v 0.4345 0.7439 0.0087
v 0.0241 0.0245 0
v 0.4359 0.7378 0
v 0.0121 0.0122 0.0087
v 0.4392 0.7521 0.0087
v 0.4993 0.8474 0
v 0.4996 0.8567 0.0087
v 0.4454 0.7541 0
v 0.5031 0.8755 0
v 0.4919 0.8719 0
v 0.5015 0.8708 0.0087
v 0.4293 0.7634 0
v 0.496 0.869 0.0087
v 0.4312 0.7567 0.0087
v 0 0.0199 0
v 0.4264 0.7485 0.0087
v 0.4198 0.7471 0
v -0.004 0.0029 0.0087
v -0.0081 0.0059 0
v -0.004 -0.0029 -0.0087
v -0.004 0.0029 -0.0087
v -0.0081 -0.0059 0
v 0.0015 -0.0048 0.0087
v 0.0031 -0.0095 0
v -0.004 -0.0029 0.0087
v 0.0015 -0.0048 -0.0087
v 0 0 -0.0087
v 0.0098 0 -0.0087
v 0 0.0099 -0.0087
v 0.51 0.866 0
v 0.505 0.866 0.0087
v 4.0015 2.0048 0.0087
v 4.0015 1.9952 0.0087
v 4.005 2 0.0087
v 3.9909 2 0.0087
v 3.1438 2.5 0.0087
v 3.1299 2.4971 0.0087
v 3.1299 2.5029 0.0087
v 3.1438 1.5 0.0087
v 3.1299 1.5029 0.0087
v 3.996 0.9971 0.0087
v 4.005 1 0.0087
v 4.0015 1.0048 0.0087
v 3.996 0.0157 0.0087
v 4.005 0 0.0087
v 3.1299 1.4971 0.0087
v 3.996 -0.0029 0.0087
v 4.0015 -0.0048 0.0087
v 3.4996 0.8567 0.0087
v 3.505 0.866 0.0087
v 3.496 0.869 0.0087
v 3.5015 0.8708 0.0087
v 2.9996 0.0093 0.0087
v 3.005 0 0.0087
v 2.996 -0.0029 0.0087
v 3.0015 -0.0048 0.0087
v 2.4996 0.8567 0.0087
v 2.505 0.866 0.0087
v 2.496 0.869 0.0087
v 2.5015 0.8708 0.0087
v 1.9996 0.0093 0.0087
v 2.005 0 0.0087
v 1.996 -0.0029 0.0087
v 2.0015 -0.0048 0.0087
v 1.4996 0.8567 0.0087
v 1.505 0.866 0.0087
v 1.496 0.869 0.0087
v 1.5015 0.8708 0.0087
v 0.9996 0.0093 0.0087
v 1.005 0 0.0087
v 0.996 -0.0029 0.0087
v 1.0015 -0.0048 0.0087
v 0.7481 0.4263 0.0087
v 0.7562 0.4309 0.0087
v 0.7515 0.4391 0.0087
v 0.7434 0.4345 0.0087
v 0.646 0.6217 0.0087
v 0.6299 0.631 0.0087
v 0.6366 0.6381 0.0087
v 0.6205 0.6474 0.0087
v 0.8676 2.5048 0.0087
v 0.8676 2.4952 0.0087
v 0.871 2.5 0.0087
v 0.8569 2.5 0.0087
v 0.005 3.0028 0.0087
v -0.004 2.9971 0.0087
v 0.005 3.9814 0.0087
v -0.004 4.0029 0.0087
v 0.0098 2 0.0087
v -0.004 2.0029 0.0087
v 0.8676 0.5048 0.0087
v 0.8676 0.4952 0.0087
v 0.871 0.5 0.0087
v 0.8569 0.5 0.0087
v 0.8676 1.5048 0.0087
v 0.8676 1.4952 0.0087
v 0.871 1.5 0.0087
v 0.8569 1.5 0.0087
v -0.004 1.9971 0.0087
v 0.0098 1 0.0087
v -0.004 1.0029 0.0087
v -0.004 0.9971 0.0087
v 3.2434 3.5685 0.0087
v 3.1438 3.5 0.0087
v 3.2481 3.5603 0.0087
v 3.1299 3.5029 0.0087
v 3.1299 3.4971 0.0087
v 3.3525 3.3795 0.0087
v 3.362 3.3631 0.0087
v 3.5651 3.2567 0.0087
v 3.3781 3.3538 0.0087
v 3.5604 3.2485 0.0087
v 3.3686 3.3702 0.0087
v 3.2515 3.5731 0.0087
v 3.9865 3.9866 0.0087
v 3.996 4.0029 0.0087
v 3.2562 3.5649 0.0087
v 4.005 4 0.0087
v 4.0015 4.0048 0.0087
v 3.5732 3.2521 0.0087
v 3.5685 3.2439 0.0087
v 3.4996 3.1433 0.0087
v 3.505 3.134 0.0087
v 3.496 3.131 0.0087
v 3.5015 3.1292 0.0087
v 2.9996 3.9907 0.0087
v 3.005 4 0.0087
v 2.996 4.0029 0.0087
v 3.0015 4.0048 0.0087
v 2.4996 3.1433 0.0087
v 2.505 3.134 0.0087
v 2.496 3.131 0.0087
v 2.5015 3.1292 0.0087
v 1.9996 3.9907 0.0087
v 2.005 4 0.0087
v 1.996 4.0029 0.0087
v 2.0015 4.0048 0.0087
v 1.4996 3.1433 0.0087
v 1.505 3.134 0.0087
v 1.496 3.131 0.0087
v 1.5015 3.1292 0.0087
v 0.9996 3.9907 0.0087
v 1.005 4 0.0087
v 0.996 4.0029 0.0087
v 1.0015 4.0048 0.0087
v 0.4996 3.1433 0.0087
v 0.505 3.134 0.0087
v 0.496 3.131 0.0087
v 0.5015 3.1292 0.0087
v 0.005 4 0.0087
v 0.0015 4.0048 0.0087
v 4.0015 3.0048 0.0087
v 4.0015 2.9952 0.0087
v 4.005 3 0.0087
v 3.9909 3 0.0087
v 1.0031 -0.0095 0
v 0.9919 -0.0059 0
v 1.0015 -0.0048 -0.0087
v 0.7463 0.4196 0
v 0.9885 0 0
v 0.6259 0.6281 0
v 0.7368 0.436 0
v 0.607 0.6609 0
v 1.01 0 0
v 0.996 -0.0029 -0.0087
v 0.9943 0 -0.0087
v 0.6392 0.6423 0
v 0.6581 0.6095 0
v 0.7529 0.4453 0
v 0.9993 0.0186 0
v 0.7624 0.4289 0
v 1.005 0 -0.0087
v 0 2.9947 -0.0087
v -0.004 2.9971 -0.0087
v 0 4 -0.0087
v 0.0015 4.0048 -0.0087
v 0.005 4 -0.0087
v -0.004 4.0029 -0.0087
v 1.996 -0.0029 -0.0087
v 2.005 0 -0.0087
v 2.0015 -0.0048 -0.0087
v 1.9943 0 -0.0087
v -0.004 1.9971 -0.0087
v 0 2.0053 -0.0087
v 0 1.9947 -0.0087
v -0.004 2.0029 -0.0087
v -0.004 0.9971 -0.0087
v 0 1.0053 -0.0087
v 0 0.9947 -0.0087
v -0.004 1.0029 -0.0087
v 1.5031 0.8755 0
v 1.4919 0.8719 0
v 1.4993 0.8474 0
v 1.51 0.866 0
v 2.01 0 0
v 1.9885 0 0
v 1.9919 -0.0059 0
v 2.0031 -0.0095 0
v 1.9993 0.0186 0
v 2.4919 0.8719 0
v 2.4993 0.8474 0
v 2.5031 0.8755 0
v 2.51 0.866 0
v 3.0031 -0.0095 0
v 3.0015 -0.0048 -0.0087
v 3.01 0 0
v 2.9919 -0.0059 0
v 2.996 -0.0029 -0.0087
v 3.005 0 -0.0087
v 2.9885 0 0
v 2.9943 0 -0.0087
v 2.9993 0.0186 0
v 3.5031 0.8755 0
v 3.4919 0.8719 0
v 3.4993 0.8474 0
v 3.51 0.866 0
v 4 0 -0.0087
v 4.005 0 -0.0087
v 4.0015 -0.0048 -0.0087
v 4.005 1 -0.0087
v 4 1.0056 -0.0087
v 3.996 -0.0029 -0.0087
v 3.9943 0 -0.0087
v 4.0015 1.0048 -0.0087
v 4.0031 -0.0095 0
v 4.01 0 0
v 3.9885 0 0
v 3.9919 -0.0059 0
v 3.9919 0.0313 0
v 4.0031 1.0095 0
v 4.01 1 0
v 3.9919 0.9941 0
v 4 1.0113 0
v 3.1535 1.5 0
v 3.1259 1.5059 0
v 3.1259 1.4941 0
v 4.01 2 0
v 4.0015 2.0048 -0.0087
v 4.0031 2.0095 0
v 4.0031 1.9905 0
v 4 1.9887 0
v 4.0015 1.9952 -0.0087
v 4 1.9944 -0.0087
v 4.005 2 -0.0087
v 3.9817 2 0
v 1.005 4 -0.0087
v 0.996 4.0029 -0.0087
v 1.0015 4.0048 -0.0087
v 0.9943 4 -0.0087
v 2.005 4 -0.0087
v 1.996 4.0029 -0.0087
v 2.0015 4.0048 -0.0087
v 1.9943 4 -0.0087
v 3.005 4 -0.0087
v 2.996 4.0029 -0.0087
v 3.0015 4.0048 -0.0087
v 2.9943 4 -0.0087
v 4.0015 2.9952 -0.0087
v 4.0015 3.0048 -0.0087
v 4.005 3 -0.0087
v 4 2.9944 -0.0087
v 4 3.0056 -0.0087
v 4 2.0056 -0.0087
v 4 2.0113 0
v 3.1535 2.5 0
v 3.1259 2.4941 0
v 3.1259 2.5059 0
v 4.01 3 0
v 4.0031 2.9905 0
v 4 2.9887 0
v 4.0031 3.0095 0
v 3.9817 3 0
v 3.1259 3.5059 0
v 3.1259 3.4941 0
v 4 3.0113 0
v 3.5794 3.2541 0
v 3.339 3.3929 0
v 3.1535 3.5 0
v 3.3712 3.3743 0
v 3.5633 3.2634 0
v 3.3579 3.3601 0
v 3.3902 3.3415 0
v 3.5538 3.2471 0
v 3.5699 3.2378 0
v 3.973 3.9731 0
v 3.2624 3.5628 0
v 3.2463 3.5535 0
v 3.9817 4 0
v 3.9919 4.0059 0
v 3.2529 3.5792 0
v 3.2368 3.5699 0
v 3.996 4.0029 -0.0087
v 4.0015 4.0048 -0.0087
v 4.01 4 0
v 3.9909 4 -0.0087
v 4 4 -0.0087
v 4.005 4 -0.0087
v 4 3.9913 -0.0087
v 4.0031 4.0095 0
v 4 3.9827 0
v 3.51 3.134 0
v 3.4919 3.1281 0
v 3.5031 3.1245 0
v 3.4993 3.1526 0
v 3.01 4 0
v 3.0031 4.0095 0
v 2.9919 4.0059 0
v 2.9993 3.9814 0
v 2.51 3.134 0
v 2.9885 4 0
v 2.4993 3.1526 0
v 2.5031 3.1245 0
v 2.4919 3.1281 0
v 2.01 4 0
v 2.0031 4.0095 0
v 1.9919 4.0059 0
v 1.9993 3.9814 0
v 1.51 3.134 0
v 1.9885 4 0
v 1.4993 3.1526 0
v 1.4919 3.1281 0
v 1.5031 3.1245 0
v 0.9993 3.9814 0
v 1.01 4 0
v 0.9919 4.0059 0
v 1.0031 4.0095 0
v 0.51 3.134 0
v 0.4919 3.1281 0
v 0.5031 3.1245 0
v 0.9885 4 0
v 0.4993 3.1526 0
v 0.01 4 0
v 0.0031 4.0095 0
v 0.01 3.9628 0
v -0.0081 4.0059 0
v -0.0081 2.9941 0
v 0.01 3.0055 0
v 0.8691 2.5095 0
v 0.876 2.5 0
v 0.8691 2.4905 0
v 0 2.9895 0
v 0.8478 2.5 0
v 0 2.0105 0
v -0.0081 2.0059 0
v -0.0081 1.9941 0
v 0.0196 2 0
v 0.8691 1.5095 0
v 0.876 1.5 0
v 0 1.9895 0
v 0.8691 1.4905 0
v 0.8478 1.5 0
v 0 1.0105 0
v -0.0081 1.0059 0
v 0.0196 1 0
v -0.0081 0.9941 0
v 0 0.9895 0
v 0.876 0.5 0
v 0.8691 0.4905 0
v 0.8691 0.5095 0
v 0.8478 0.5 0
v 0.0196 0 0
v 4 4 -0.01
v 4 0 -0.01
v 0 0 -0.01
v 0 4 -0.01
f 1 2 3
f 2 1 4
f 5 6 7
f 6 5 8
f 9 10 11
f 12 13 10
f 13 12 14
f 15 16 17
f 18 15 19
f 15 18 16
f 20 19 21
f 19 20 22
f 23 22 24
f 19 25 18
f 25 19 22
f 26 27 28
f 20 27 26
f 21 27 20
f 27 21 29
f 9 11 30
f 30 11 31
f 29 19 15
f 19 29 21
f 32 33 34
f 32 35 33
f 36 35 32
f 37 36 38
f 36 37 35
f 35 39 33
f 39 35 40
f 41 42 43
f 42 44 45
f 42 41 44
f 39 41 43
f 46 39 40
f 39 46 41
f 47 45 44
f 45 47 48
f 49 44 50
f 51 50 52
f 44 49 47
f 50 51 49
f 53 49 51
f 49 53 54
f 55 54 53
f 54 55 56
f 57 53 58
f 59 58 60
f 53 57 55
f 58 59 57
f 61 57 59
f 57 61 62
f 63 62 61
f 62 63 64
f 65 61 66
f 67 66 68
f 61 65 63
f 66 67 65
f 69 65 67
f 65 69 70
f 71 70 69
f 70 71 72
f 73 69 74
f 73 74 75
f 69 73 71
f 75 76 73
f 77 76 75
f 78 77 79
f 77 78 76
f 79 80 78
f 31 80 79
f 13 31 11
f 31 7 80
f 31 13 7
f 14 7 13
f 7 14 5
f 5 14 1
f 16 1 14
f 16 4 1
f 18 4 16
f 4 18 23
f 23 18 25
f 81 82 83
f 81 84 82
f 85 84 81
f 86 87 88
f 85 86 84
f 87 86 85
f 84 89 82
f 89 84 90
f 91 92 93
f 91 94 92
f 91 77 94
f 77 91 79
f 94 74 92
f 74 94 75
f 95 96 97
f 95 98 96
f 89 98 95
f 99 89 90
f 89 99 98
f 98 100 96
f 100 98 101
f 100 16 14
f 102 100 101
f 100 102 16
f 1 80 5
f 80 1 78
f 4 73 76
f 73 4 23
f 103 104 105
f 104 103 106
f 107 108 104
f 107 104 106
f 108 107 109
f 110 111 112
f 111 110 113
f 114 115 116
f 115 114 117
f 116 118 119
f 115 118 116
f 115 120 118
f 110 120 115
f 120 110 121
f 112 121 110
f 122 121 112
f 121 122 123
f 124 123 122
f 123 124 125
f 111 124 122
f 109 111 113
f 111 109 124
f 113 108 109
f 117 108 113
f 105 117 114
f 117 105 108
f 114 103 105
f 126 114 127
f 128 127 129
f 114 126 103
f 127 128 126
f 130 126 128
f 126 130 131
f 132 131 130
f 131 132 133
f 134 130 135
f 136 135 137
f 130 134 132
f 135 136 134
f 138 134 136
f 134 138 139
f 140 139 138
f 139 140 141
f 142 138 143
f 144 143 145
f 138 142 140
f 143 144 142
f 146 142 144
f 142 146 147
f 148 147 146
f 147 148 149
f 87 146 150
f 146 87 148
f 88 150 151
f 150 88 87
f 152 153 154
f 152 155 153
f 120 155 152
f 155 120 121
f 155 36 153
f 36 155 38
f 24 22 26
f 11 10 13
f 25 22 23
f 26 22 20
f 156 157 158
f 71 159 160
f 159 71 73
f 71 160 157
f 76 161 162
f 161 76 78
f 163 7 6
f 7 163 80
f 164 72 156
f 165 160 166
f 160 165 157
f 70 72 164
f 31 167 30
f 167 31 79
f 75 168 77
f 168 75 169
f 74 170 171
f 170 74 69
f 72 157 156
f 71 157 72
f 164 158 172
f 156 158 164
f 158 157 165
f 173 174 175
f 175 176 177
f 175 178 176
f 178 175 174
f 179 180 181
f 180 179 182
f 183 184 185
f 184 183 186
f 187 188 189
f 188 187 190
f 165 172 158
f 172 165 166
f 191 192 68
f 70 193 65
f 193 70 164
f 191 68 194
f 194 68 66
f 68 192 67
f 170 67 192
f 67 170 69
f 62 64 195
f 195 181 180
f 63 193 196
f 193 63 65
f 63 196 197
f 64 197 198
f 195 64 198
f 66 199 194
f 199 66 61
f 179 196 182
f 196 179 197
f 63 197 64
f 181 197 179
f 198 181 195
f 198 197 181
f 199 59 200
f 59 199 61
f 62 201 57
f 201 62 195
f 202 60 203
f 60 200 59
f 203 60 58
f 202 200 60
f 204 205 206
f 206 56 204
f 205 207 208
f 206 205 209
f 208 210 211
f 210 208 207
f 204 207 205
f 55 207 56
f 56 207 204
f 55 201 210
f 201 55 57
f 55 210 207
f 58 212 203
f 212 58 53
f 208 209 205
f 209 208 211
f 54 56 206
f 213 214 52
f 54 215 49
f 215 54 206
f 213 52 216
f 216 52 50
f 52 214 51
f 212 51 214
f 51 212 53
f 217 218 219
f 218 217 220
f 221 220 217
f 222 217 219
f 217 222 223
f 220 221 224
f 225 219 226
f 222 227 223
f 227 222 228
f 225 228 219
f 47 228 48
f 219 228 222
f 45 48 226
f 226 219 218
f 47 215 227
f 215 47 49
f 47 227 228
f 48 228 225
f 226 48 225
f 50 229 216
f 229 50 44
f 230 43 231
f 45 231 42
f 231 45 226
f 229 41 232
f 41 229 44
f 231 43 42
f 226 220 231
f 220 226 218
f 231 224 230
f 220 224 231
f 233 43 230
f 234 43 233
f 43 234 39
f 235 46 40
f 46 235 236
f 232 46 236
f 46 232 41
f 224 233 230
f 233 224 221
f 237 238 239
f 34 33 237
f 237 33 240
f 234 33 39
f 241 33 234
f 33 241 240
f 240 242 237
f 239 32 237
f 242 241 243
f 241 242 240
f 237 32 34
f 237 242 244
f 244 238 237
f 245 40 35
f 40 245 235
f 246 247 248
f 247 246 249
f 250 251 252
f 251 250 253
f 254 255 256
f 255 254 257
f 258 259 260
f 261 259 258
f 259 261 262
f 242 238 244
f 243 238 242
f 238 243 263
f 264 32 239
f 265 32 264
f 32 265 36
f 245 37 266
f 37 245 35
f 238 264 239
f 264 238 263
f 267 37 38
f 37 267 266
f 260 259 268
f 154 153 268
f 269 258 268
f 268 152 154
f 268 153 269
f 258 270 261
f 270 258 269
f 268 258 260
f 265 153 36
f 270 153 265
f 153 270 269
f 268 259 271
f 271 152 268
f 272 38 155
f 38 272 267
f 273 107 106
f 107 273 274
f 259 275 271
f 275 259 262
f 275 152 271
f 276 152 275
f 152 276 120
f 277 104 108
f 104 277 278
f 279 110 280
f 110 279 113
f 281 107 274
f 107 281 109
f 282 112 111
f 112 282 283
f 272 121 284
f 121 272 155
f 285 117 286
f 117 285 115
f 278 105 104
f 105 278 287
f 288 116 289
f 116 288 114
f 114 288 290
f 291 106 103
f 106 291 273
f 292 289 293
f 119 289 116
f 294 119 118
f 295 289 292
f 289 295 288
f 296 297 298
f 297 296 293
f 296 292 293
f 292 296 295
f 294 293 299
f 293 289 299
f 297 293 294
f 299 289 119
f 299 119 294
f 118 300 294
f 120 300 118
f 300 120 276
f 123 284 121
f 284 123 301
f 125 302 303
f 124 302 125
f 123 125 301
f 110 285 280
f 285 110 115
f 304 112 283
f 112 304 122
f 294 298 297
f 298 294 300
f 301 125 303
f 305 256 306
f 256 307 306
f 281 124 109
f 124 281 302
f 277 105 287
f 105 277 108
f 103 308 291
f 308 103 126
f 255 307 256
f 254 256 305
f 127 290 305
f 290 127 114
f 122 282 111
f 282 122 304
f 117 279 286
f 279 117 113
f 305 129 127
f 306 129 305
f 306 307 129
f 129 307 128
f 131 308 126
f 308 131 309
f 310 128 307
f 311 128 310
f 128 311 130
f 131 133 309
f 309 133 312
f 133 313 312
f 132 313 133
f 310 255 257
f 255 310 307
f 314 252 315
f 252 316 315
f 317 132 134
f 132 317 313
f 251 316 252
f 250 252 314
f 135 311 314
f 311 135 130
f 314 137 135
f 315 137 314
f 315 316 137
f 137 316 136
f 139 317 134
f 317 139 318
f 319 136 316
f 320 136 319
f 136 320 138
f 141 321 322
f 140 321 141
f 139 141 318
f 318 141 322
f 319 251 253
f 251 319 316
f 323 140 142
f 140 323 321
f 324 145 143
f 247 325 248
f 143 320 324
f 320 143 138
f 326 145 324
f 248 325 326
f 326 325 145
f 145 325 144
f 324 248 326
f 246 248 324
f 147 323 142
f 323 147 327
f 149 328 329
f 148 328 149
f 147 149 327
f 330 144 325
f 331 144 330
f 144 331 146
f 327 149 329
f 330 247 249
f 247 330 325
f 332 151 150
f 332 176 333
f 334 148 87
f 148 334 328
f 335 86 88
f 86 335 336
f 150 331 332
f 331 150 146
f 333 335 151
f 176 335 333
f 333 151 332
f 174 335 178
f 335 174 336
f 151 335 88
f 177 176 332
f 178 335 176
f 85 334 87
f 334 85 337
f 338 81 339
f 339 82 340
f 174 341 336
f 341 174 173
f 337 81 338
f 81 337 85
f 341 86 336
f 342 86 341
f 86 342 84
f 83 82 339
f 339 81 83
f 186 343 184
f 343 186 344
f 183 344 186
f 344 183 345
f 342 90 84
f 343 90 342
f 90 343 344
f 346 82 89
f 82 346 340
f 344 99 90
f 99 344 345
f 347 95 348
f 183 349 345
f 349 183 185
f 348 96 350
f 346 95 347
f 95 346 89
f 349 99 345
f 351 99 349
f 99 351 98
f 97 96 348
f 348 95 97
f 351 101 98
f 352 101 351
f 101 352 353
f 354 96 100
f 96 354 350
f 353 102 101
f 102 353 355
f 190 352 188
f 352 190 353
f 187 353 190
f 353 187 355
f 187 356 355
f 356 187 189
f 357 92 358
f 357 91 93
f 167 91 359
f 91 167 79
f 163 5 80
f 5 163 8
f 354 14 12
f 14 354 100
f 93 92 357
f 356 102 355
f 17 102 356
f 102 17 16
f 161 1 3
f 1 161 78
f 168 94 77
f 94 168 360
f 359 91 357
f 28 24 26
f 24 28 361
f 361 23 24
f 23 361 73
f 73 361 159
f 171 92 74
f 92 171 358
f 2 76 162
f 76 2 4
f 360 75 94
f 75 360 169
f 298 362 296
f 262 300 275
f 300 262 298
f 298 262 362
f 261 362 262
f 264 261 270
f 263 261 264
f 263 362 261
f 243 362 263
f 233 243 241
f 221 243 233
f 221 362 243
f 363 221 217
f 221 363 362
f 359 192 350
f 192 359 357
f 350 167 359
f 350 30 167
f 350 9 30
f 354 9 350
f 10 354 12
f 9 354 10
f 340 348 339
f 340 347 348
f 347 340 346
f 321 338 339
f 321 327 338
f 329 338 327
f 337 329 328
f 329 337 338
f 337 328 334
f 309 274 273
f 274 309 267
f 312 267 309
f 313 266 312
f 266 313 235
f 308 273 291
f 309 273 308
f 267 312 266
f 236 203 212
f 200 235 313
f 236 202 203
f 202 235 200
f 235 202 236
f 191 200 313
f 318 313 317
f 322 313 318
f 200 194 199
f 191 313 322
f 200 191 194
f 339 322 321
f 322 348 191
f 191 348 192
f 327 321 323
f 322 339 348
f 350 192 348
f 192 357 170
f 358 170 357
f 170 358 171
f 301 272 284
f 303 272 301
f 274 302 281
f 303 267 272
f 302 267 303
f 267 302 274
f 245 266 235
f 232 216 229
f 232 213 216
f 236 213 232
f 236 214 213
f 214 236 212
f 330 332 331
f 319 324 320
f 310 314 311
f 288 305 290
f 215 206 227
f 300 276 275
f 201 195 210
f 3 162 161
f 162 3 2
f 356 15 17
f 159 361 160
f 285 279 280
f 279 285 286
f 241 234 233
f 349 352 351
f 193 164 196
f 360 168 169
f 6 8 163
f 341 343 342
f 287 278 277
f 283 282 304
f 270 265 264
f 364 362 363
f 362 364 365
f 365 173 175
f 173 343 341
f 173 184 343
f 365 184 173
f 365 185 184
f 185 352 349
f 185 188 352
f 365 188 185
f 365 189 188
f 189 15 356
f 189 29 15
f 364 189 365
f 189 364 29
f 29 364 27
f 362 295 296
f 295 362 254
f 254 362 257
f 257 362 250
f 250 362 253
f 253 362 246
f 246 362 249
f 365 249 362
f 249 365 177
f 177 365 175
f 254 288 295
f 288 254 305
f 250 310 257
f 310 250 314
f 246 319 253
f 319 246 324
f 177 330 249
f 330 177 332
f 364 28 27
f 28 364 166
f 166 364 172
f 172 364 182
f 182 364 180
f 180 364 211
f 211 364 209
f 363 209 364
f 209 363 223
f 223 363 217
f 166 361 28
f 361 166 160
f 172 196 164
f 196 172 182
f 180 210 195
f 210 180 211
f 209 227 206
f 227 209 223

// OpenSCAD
hull(){
    translate([0, 0]) sphere(0.01);
    translate([0.5, 0.866025]) sphere(0.01);
}
hull(){
    translate([0.5, 0.866025]) sphere(0.01);
    translate([1, 0]) sphere(0.01);
}
hull(){
    translate([1, 0]) sphere(0.01);
    translate([1.5, 0.866025]) sphere(0.01);
}
hull(){
    translate([1.5, 0.866025]) sphere(0.01);
    translate([2, 0]) sphere(0.01);
}
hull(){
    translate([2, 0]) sphere(0.01);
    translate([2.5, 0.866025]) sphere(0.01);
}
hull(){
    translate([2.5, 0.866025]) sphere(0.01);
    translate([3, 0]) sphere(0.01);
}
hull(){
    translate([3, 0]) sphere(0.01);
    translate([3.5, 0.866025]) sphere(0.01);
}
hull(){
    translate([3.5, 0.866025]) sphere(0.01);
    translate([4, 0]) sphere(0.01);
}
hull(){
    translate([4, 0]) sphere(0.01);
    translate([4, 1]) sphere(0.01);
}
hull(){
    translate([4, 1]) sphere(0.01);
    translate([3.133975, 1.5]) sphere(0.01);
}
hull(){
    translate([3.133975, 1.5]) sphere(0.01);
    translate([4, 2]) sphere(0.01);
}
hull(){
    translate([4, 2]) sphere(0.01);
    translate([3.133975, 2.5]) sphere(0.01);
}
hull(){
    translate([3.133975, 2.5]) sphere(0.01);
    translate([4, 3]) sphere(0.01);
}
hull(){
    translate([4, 3]) sphere(0.01);
    translate([3.133975, 3.5]) sphere(0.01);
}
hull(){
    translate([3.133975, 3.5]) sphere(0.01);
    translate([4, 4]) sphere(0.01);
}
hull(){
    translate([4, 4]) sphere(0.01);
    translate([3.5, 3.133975]) sphere(0.01);
}
hull(){
    translate([3.5, 3.133975]) sphere(0.01);
    translate([3, 4]) sphere(0.01);
}
hull(){
    translate([3, 4]) sphere(0.01);
    translate([2.5, 3.133975]) sphere(0.01);
}
hull(){
    translate([2.5, 3.133975]) sphere(0.01);
    translate([2, 4]) sphere(0.01);
}
hull(){
    translate([2, 4]) sphere(0.01);
    translate([1.5, 3.133975]) sphere(0.01);
}
hull(){
    translate([1.5, 3.133975]) sphere(0.01);
    translate([1, 4]) sphere(0.01);
}
hull(){
    translate([1, 4]) sphere(0.01);
    translate([0.5, 3.133975]) sphere(0.01);
}
hull(){
    translate([0.5, 3.133975]) sphere(0.01);
    translate([0, 4]) sphere(0.01);
}
hull(){
    translate([0, 4]) sphere(0.01);
    translate([0, 3]) sphere(0.01);
}
hull(){
    translate([0, 3]) sphere(0.01);
    translate([0.866025, 2.5]) sphere(0.01);
}
hull(){
    translate([0.866025, 2.5]) sphere(0.01);
    translate([0, 2]) sphere(0.01);
}
hull(){
    translate([0, 2]) sphere(0.01);
    translate([0.866025, 1.5]) sphere(0.01);
}
hull(){
    translate([0.866025, 1.5]) sphere(0.01);
    translate([0, 1]) sphere(0.01);
}
hull(){
    translate([0, 1]) sphere(0.01);
    translate([0.866025, 0.5]) sphere(0.01);
}
hull(){
    translate([0.866025, 0.5]) sphere(0.01);
    translate([0, 0]) sphere(0.01);
}
translate([0,0,-0.01]) color([0.1,0.1,0.1]) cube([4,4,0.01]);
